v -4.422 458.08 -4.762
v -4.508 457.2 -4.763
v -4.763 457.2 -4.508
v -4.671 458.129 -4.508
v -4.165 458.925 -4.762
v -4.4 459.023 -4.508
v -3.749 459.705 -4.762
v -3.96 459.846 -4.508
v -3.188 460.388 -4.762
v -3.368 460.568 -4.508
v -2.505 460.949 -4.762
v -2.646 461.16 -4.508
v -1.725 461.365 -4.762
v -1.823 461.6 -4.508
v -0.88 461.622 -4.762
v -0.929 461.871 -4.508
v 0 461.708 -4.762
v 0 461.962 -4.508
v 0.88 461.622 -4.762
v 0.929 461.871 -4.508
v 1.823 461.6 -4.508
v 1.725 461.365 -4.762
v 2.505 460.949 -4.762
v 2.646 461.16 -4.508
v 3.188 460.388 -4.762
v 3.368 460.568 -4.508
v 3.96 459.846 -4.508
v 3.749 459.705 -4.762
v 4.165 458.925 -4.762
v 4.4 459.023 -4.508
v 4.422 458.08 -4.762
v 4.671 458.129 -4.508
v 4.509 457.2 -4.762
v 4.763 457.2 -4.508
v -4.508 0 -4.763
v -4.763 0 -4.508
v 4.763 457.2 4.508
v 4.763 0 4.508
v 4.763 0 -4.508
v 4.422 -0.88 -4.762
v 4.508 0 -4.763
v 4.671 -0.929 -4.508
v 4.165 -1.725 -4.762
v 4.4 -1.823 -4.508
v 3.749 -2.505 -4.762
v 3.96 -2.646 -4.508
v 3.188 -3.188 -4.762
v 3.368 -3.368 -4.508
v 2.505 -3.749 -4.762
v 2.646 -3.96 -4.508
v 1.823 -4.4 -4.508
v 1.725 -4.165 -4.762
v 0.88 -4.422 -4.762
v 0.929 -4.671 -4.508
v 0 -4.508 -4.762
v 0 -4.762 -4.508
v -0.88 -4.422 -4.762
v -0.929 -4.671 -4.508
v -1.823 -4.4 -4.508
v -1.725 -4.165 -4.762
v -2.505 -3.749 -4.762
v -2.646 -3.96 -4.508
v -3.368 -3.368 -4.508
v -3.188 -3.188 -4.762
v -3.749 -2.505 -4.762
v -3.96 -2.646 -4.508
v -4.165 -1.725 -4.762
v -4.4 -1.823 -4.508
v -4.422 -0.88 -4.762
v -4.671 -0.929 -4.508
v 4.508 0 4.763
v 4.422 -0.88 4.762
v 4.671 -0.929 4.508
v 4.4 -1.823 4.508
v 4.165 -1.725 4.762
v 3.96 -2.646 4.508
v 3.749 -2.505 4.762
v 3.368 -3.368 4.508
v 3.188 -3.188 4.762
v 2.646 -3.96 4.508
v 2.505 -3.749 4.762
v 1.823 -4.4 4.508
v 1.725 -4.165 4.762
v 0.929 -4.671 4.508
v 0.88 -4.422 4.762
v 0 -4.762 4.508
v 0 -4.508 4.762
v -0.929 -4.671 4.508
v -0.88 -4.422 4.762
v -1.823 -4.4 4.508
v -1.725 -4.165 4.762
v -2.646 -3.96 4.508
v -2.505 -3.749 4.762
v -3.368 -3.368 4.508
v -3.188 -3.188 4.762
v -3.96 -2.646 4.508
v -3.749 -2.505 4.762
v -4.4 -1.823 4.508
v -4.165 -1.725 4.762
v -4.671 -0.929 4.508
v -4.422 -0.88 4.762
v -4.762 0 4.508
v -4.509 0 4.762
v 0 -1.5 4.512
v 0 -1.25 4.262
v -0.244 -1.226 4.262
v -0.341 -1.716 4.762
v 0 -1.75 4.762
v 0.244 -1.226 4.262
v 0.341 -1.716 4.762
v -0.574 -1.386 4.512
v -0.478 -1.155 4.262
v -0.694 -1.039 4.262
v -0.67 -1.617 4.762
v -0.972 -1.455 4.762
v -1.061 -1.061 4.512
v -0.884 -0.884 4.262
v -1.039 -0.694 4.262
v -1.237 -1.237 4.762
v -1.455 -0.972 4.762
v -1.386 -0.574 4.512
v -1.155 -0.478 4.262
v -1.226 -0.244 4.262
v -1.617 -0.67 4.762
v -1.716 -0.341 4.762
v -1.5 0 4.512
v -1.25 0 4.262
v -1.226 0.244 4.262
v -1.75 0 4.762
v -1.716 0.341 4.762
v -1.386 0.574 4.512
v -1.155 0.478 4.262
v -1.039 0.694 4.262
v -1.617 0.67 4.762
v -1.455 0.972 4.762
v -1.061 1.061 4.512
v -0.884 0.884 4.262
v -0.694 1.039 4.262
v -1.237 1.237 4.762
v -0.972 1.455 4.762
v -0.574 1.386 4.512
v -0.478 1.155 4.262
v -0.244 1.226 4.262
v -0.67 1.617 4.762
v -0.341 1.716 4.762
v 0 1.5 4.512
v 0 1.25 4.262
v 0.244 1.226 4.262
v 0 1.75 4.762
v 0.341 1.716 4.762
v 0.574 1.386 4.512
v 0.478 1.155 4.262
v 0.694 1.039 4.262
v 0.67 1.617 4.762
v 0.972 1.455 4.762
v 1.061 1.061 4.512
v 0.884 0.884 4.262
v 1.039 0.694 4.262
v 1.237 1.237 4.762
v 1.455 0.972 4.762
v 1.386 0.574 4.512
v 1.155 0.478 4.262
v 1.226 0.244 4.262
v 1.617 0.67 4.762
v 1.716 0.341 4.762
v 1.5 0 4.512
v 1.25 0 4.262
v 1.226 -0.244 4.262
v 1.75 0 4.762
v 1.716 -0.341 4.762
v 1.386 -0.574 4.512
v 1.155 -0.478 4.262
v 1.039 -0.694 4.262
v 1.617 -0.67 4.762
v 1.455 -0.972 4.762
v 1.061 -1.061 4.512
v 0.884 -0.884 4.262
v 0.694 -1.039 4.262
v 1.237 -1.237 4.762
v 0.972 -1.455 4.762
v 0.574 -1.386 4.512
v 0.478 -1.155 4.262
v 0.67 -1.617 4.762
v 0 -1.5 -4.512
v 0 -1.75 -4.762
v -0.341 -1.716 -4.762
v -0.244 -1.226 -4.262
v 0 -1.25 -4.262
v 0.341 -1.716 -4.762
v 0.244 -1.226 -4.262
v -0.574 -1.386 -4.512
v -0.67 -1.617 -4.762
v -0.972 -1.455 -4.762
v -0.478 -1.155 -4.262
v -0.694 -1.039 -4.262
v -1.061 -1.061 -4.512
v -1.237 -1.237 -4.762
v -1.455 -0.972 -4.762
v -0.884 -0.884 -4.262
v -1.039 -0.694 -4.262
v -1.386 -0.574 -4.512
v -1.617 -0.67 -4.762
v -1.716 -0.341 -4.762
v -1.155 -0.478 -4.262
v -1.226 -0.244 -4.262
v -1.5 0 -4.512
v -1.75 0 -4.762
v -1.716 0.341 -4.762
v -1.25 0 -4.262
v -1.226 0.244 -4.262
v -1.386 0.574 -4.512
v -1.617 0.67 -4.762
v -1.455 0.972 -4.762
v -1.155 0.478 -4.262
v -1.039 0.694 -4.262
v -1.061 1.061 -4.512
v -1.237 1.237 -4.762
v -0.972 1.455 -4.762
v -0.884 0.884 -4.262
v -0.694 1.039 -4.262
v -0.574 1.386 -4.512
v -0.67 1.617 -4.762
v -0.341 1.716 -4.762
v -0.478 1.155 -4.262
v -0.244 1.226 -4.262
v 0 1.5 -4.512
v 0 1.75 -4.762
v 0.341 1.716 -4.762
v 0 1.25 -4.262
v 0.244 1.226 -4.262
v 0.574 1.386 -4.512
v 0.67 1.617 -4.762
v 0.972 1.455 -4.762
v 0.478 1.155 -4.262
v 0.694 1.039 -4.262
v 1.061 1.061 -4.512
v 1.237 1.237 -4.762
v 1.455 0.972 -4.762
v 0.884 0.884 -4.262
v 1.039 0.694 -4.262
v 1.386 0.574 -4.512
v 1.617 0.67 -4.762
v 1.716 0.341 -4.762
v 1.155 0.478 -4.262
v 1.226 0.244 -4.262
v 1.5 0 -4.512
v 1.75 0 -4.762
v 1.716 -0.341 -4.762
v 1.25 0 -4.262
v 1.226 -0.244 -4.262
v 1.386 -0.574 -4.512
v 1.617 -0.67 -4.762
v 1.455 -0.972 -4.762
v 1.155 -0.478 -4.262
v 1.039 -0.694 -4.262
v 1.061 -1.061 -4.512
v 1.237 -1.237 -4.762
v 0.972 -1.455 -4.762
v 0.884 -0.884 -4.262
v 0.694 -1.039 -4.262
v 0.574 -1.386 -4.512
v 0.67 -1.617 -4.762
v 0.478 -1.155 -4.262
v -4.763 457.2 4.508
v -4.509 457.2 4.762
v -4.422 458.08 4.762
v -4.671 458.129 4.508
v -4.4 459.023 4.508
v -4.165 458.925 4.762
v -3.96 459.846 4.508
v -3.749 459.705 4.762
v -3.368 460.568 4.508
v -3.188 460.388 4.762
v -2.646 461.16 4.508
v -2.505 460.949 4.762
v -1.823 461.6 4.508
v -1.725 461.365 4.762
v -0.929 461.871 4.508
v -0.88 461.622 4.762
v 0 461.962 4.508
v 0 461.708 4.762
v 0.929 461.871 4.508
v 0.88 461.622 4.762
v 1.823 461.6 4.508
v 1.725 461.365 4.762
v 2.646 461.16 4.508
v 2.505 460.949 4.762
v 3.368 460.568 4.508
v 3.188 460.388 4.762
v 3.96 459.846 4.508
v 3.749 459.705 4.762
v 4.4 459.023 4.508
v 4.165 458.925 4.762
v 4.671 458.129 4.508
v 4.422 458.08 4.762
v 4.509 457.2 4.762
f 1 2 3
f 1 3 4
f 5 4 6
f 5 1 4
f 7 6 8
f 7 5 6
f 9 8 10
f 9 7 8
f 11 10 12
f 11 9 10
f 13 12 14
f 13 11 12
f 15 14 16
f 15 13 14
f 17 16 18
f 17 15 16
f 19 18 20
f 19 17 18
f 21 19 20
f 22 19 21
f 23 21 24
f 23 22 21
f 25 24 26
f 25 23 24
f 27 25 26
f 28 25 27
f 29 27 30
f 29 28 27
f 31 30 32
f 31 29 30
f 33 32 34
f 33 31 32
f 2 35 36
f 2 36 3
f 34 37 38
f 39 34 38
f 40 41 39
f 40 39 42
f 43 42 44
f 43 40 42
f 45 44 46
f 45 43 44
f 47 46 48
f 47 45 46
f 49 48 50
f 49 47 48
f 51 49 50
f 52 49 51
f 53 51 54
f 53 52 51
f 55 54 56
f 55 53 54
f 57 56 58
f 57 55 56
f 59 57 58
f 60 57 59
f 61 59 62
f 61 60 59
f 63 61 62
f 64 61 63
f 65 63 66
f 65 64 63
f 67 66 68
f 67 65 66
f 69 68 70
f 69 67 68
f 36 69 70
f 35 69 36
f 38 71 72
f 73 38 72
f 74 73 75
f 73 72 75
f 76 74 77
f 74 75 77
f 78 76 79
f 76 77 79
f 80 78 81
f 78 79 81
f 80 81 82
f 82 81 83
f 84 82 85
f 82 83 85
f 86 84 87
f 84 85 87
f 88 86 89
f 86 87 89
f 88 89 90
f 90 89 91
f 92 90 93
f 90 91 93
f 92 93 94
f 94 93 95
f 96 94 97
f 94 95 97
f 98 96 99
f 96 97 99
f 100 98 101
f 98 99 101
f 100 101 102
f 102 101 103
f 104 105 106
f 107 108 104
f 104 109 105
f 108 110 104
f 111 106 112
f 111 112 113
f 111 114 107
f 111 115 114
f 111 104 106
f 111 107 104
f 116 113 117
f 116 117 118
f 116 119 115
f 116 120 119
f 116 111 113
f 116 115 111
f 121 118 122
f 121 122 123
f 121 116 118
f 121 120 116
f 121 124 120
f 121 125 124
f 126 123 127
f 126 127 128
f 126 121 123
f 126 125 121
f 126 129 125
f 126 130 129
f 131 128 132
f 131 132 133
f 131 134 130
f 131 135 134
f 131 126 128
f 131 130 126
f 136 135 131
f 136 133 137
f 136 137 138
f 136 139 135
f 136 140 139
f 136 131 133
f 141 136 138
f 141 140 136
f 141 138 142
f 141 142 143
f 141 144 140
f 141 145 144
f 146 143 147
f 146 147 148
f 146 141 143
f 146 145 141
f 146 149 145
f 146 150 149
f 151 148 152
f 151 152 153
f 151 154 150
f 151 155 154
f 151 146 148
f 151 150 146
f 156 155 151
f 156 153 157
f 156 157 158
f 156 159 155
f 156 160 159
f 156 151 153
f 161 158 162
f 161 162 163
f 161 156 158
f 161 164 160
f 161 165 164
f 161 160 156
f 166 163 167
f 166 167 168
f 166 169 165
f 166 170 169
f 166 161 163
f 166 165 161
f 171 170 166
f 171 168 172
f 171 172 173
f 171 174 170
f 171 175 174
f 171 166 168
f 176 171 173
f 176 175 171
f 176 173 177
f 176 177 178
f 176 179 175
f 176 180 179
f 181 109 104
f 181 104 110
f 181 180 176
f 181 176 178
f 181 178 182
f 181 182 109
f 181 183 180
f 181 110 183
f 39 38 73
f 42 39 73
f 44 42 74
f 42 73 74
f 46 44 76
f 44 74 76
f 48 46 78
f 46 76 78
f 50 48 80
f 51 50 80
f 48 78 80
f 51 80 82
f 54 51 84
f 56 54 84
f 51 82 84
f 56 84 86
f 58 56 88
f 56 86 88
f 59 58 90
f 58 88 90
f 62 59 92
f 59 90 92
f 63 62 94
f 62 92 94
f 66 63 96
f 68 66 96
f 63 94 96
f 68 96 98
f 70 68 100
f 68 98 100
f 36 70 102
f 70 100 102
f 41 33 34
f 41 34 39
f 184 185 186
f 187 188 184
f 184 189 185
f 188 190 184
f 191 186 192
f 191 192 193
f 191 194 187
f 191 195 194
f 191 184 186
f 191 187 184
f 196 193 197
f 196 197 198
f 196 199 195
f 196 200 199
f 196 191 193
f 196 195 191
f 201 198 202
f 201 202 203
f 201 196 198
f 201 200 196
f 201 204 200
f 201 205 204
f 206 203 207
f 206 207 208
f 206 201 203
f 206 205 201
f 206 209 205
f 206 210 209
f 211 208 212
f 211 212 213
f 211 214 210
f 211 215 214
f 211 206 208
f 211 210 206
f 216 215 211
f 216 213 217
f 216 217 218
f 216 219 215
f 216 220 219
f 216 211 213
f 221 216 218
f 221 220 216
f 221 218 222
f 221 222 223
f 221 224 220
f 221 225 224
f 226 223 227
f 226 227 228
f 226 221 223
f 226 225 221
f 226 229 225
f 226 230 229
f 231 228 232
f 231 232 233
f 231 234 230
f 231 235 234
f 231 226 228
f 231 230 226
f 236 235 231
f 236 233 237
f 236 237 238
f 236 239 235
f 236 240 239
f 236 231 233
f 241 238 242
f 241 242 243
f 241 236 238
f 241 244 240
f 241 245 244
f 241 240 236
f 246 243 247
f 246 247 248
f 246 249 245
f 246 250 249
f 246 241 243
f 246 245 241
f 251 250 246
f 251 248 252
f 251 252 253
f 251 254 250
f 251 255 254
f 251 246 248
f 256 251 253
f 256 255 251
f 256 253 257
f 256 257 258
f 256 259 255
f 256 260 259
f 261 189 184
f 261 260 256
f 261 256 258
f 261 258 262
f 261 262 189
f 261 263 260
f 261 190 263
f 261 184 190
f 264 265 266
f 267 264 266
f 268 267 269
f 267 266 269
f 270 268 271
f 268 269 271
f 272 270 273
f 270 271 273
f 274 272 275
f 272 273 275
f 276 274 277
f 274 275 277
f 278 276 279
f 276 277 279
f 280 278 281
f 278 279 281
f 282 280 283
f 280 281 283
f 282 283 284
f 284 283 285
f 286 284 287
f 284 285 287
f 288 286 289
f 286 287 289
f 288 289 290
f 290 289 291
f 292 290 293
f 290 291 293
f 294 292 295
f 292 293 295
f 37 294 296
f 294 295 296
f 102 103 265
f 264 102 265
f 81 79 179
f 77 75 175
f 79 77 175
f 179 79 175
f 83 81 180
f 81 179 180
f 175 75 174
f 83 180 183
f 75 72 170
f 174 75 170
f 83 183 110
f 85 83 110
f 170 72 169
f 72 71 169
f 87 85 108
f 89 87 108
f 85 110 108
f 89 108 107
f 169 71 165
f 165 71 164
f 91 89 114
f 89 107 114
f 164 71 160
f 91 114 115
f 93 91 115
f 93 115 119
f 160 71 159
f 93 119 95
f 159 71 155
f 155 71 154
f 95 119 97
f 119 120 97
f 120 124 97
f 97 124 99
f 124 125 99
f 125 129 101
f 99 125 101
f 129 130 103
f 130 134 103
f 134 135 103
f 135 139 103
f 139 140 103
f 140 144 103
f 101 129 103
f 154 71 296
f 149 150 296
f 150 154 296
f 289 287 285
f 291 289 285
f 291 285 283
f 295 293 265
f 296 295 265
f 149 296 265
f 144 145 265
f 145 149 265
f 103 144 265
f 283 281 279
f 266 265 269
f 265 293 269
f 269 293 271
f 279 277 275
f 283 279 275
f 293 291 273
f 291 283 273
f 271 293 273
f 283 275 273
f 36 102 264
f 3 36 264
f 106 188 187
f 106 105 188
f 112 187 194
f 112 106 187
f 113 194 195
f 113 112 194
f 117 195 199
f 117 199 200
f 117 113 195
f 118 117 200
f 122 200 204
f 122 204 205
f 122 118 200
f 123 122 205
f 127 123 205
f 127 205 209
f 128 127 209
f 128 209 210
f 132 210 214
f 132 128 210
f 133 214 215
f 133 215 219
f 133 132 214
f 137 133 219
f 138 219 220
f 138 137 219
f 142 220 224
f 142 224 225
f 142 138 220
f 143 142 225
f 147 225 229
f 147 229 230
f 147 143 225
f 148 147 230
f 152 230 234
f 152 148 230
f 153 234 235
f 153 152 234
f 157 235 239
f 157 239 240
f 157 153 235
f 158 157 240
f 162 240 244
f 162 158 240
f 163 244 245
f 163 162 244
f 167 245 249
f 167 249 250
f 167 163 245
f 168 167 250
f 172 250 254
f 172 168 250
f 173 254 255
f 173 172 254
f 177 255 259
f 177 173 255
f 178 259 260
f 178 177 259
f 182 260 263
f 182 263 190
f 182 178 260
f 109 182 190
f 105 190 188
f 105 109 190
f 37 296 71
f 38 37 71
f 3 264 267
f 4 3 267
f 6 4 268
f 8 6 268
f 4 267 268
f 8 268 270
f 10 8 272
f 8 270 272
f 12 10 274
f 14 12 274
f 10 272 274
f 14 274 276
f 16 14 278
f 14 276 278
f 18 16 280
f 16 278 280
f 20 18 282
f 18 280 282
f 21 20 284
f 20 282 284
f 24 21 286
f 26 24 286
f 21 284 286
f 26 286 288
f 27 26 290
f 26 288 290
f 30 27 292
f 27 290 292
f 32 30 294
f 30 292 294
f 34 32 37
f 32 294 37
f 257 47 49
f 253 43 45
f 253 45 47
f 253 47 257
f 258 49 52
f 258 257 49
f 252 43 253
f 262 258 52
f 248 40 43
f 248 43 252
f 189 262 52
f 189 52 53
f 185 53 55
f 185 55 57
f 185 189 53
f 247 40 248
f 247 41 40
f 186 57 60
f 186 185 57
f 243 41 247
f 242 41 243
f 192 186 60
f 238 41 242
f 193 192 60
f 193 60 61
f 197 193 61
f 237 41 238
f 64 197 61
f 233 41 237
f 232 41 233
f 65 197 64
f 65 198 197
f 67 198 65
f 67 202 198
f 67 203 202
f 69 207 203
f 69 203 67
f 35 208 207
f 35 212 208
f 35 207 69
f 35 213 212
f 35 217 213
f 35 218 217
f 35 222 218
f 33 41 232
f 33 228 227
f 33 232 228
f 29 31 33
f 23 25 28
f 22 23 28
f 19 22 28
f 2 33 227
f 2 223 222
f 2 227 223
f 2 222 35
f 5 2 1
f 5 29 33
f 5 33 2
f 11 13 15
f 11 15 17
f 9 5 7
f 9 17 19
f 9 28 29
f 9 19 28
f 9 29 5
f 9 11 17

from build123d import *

# Parameters (mm, degrees)
BOSS_EXTRUDE1_DEPTH = 4.7625
CHAMFER1_SIZE       = 0.254


with BuildPart() as part:
    # Sketch1 → Boss-Extrude1 (new body, symmetric)
    with BuildSketch(Plane.XY):
        with BuildLine():
            Line((-4.7625, 0), (-4.7625, 457.2))
            ThreePointArc((-4.7625, 457.2), (0, 461.9625), (4.7625, 457.2))
            Line((4.7625, 457.2), (4.7625, 0))
            ThreePointArc((4.7625, 0), (0, -4.7625), (-4.7625, 0))
        make_face()
    extrude(amount=BOSS_EXTRUDE1_DEPTH, both=True)

    # Sketch3 → M3x0.5 Tapped Hole1 (revolve, cut)
    with BuildSketch(Plane(origin=(0, 0, 4.7625), x_dir=(0, -1, 0), z_dir=(1, 0, 0))):
        Polygon((0, 0), (0, 9.525), (1.75, 9.525), (1.25, 9.025), (1.25, 0.5), (1.75, 0), align=None)
    revolve(axis=Axis((0, 0, 11.1125), (0, 0, -1)), mode=Mode.SUBTRACT)

    # Chamfer1
    chamfer1_edges = [part.edges().sort_by_distance(p)[0] for p in [
        (0, 461.9625, 4.7625),
        (-4.7625, 228.6, 4.7625),
        (0, -4.7625, 4.7625),
        (-4.7625, 228.6, -4.7625),
        (0, 461.9625, -4.7625),
        (4.7625, 228.6, -4.7625),
        (0, -4.7625, -4.7625),
        (4.7625, 228.6, 4.7625),
    ]]
    chamfer(chamfer1_edges, length=CHAMFER1_SIZE)


solid = part.part
